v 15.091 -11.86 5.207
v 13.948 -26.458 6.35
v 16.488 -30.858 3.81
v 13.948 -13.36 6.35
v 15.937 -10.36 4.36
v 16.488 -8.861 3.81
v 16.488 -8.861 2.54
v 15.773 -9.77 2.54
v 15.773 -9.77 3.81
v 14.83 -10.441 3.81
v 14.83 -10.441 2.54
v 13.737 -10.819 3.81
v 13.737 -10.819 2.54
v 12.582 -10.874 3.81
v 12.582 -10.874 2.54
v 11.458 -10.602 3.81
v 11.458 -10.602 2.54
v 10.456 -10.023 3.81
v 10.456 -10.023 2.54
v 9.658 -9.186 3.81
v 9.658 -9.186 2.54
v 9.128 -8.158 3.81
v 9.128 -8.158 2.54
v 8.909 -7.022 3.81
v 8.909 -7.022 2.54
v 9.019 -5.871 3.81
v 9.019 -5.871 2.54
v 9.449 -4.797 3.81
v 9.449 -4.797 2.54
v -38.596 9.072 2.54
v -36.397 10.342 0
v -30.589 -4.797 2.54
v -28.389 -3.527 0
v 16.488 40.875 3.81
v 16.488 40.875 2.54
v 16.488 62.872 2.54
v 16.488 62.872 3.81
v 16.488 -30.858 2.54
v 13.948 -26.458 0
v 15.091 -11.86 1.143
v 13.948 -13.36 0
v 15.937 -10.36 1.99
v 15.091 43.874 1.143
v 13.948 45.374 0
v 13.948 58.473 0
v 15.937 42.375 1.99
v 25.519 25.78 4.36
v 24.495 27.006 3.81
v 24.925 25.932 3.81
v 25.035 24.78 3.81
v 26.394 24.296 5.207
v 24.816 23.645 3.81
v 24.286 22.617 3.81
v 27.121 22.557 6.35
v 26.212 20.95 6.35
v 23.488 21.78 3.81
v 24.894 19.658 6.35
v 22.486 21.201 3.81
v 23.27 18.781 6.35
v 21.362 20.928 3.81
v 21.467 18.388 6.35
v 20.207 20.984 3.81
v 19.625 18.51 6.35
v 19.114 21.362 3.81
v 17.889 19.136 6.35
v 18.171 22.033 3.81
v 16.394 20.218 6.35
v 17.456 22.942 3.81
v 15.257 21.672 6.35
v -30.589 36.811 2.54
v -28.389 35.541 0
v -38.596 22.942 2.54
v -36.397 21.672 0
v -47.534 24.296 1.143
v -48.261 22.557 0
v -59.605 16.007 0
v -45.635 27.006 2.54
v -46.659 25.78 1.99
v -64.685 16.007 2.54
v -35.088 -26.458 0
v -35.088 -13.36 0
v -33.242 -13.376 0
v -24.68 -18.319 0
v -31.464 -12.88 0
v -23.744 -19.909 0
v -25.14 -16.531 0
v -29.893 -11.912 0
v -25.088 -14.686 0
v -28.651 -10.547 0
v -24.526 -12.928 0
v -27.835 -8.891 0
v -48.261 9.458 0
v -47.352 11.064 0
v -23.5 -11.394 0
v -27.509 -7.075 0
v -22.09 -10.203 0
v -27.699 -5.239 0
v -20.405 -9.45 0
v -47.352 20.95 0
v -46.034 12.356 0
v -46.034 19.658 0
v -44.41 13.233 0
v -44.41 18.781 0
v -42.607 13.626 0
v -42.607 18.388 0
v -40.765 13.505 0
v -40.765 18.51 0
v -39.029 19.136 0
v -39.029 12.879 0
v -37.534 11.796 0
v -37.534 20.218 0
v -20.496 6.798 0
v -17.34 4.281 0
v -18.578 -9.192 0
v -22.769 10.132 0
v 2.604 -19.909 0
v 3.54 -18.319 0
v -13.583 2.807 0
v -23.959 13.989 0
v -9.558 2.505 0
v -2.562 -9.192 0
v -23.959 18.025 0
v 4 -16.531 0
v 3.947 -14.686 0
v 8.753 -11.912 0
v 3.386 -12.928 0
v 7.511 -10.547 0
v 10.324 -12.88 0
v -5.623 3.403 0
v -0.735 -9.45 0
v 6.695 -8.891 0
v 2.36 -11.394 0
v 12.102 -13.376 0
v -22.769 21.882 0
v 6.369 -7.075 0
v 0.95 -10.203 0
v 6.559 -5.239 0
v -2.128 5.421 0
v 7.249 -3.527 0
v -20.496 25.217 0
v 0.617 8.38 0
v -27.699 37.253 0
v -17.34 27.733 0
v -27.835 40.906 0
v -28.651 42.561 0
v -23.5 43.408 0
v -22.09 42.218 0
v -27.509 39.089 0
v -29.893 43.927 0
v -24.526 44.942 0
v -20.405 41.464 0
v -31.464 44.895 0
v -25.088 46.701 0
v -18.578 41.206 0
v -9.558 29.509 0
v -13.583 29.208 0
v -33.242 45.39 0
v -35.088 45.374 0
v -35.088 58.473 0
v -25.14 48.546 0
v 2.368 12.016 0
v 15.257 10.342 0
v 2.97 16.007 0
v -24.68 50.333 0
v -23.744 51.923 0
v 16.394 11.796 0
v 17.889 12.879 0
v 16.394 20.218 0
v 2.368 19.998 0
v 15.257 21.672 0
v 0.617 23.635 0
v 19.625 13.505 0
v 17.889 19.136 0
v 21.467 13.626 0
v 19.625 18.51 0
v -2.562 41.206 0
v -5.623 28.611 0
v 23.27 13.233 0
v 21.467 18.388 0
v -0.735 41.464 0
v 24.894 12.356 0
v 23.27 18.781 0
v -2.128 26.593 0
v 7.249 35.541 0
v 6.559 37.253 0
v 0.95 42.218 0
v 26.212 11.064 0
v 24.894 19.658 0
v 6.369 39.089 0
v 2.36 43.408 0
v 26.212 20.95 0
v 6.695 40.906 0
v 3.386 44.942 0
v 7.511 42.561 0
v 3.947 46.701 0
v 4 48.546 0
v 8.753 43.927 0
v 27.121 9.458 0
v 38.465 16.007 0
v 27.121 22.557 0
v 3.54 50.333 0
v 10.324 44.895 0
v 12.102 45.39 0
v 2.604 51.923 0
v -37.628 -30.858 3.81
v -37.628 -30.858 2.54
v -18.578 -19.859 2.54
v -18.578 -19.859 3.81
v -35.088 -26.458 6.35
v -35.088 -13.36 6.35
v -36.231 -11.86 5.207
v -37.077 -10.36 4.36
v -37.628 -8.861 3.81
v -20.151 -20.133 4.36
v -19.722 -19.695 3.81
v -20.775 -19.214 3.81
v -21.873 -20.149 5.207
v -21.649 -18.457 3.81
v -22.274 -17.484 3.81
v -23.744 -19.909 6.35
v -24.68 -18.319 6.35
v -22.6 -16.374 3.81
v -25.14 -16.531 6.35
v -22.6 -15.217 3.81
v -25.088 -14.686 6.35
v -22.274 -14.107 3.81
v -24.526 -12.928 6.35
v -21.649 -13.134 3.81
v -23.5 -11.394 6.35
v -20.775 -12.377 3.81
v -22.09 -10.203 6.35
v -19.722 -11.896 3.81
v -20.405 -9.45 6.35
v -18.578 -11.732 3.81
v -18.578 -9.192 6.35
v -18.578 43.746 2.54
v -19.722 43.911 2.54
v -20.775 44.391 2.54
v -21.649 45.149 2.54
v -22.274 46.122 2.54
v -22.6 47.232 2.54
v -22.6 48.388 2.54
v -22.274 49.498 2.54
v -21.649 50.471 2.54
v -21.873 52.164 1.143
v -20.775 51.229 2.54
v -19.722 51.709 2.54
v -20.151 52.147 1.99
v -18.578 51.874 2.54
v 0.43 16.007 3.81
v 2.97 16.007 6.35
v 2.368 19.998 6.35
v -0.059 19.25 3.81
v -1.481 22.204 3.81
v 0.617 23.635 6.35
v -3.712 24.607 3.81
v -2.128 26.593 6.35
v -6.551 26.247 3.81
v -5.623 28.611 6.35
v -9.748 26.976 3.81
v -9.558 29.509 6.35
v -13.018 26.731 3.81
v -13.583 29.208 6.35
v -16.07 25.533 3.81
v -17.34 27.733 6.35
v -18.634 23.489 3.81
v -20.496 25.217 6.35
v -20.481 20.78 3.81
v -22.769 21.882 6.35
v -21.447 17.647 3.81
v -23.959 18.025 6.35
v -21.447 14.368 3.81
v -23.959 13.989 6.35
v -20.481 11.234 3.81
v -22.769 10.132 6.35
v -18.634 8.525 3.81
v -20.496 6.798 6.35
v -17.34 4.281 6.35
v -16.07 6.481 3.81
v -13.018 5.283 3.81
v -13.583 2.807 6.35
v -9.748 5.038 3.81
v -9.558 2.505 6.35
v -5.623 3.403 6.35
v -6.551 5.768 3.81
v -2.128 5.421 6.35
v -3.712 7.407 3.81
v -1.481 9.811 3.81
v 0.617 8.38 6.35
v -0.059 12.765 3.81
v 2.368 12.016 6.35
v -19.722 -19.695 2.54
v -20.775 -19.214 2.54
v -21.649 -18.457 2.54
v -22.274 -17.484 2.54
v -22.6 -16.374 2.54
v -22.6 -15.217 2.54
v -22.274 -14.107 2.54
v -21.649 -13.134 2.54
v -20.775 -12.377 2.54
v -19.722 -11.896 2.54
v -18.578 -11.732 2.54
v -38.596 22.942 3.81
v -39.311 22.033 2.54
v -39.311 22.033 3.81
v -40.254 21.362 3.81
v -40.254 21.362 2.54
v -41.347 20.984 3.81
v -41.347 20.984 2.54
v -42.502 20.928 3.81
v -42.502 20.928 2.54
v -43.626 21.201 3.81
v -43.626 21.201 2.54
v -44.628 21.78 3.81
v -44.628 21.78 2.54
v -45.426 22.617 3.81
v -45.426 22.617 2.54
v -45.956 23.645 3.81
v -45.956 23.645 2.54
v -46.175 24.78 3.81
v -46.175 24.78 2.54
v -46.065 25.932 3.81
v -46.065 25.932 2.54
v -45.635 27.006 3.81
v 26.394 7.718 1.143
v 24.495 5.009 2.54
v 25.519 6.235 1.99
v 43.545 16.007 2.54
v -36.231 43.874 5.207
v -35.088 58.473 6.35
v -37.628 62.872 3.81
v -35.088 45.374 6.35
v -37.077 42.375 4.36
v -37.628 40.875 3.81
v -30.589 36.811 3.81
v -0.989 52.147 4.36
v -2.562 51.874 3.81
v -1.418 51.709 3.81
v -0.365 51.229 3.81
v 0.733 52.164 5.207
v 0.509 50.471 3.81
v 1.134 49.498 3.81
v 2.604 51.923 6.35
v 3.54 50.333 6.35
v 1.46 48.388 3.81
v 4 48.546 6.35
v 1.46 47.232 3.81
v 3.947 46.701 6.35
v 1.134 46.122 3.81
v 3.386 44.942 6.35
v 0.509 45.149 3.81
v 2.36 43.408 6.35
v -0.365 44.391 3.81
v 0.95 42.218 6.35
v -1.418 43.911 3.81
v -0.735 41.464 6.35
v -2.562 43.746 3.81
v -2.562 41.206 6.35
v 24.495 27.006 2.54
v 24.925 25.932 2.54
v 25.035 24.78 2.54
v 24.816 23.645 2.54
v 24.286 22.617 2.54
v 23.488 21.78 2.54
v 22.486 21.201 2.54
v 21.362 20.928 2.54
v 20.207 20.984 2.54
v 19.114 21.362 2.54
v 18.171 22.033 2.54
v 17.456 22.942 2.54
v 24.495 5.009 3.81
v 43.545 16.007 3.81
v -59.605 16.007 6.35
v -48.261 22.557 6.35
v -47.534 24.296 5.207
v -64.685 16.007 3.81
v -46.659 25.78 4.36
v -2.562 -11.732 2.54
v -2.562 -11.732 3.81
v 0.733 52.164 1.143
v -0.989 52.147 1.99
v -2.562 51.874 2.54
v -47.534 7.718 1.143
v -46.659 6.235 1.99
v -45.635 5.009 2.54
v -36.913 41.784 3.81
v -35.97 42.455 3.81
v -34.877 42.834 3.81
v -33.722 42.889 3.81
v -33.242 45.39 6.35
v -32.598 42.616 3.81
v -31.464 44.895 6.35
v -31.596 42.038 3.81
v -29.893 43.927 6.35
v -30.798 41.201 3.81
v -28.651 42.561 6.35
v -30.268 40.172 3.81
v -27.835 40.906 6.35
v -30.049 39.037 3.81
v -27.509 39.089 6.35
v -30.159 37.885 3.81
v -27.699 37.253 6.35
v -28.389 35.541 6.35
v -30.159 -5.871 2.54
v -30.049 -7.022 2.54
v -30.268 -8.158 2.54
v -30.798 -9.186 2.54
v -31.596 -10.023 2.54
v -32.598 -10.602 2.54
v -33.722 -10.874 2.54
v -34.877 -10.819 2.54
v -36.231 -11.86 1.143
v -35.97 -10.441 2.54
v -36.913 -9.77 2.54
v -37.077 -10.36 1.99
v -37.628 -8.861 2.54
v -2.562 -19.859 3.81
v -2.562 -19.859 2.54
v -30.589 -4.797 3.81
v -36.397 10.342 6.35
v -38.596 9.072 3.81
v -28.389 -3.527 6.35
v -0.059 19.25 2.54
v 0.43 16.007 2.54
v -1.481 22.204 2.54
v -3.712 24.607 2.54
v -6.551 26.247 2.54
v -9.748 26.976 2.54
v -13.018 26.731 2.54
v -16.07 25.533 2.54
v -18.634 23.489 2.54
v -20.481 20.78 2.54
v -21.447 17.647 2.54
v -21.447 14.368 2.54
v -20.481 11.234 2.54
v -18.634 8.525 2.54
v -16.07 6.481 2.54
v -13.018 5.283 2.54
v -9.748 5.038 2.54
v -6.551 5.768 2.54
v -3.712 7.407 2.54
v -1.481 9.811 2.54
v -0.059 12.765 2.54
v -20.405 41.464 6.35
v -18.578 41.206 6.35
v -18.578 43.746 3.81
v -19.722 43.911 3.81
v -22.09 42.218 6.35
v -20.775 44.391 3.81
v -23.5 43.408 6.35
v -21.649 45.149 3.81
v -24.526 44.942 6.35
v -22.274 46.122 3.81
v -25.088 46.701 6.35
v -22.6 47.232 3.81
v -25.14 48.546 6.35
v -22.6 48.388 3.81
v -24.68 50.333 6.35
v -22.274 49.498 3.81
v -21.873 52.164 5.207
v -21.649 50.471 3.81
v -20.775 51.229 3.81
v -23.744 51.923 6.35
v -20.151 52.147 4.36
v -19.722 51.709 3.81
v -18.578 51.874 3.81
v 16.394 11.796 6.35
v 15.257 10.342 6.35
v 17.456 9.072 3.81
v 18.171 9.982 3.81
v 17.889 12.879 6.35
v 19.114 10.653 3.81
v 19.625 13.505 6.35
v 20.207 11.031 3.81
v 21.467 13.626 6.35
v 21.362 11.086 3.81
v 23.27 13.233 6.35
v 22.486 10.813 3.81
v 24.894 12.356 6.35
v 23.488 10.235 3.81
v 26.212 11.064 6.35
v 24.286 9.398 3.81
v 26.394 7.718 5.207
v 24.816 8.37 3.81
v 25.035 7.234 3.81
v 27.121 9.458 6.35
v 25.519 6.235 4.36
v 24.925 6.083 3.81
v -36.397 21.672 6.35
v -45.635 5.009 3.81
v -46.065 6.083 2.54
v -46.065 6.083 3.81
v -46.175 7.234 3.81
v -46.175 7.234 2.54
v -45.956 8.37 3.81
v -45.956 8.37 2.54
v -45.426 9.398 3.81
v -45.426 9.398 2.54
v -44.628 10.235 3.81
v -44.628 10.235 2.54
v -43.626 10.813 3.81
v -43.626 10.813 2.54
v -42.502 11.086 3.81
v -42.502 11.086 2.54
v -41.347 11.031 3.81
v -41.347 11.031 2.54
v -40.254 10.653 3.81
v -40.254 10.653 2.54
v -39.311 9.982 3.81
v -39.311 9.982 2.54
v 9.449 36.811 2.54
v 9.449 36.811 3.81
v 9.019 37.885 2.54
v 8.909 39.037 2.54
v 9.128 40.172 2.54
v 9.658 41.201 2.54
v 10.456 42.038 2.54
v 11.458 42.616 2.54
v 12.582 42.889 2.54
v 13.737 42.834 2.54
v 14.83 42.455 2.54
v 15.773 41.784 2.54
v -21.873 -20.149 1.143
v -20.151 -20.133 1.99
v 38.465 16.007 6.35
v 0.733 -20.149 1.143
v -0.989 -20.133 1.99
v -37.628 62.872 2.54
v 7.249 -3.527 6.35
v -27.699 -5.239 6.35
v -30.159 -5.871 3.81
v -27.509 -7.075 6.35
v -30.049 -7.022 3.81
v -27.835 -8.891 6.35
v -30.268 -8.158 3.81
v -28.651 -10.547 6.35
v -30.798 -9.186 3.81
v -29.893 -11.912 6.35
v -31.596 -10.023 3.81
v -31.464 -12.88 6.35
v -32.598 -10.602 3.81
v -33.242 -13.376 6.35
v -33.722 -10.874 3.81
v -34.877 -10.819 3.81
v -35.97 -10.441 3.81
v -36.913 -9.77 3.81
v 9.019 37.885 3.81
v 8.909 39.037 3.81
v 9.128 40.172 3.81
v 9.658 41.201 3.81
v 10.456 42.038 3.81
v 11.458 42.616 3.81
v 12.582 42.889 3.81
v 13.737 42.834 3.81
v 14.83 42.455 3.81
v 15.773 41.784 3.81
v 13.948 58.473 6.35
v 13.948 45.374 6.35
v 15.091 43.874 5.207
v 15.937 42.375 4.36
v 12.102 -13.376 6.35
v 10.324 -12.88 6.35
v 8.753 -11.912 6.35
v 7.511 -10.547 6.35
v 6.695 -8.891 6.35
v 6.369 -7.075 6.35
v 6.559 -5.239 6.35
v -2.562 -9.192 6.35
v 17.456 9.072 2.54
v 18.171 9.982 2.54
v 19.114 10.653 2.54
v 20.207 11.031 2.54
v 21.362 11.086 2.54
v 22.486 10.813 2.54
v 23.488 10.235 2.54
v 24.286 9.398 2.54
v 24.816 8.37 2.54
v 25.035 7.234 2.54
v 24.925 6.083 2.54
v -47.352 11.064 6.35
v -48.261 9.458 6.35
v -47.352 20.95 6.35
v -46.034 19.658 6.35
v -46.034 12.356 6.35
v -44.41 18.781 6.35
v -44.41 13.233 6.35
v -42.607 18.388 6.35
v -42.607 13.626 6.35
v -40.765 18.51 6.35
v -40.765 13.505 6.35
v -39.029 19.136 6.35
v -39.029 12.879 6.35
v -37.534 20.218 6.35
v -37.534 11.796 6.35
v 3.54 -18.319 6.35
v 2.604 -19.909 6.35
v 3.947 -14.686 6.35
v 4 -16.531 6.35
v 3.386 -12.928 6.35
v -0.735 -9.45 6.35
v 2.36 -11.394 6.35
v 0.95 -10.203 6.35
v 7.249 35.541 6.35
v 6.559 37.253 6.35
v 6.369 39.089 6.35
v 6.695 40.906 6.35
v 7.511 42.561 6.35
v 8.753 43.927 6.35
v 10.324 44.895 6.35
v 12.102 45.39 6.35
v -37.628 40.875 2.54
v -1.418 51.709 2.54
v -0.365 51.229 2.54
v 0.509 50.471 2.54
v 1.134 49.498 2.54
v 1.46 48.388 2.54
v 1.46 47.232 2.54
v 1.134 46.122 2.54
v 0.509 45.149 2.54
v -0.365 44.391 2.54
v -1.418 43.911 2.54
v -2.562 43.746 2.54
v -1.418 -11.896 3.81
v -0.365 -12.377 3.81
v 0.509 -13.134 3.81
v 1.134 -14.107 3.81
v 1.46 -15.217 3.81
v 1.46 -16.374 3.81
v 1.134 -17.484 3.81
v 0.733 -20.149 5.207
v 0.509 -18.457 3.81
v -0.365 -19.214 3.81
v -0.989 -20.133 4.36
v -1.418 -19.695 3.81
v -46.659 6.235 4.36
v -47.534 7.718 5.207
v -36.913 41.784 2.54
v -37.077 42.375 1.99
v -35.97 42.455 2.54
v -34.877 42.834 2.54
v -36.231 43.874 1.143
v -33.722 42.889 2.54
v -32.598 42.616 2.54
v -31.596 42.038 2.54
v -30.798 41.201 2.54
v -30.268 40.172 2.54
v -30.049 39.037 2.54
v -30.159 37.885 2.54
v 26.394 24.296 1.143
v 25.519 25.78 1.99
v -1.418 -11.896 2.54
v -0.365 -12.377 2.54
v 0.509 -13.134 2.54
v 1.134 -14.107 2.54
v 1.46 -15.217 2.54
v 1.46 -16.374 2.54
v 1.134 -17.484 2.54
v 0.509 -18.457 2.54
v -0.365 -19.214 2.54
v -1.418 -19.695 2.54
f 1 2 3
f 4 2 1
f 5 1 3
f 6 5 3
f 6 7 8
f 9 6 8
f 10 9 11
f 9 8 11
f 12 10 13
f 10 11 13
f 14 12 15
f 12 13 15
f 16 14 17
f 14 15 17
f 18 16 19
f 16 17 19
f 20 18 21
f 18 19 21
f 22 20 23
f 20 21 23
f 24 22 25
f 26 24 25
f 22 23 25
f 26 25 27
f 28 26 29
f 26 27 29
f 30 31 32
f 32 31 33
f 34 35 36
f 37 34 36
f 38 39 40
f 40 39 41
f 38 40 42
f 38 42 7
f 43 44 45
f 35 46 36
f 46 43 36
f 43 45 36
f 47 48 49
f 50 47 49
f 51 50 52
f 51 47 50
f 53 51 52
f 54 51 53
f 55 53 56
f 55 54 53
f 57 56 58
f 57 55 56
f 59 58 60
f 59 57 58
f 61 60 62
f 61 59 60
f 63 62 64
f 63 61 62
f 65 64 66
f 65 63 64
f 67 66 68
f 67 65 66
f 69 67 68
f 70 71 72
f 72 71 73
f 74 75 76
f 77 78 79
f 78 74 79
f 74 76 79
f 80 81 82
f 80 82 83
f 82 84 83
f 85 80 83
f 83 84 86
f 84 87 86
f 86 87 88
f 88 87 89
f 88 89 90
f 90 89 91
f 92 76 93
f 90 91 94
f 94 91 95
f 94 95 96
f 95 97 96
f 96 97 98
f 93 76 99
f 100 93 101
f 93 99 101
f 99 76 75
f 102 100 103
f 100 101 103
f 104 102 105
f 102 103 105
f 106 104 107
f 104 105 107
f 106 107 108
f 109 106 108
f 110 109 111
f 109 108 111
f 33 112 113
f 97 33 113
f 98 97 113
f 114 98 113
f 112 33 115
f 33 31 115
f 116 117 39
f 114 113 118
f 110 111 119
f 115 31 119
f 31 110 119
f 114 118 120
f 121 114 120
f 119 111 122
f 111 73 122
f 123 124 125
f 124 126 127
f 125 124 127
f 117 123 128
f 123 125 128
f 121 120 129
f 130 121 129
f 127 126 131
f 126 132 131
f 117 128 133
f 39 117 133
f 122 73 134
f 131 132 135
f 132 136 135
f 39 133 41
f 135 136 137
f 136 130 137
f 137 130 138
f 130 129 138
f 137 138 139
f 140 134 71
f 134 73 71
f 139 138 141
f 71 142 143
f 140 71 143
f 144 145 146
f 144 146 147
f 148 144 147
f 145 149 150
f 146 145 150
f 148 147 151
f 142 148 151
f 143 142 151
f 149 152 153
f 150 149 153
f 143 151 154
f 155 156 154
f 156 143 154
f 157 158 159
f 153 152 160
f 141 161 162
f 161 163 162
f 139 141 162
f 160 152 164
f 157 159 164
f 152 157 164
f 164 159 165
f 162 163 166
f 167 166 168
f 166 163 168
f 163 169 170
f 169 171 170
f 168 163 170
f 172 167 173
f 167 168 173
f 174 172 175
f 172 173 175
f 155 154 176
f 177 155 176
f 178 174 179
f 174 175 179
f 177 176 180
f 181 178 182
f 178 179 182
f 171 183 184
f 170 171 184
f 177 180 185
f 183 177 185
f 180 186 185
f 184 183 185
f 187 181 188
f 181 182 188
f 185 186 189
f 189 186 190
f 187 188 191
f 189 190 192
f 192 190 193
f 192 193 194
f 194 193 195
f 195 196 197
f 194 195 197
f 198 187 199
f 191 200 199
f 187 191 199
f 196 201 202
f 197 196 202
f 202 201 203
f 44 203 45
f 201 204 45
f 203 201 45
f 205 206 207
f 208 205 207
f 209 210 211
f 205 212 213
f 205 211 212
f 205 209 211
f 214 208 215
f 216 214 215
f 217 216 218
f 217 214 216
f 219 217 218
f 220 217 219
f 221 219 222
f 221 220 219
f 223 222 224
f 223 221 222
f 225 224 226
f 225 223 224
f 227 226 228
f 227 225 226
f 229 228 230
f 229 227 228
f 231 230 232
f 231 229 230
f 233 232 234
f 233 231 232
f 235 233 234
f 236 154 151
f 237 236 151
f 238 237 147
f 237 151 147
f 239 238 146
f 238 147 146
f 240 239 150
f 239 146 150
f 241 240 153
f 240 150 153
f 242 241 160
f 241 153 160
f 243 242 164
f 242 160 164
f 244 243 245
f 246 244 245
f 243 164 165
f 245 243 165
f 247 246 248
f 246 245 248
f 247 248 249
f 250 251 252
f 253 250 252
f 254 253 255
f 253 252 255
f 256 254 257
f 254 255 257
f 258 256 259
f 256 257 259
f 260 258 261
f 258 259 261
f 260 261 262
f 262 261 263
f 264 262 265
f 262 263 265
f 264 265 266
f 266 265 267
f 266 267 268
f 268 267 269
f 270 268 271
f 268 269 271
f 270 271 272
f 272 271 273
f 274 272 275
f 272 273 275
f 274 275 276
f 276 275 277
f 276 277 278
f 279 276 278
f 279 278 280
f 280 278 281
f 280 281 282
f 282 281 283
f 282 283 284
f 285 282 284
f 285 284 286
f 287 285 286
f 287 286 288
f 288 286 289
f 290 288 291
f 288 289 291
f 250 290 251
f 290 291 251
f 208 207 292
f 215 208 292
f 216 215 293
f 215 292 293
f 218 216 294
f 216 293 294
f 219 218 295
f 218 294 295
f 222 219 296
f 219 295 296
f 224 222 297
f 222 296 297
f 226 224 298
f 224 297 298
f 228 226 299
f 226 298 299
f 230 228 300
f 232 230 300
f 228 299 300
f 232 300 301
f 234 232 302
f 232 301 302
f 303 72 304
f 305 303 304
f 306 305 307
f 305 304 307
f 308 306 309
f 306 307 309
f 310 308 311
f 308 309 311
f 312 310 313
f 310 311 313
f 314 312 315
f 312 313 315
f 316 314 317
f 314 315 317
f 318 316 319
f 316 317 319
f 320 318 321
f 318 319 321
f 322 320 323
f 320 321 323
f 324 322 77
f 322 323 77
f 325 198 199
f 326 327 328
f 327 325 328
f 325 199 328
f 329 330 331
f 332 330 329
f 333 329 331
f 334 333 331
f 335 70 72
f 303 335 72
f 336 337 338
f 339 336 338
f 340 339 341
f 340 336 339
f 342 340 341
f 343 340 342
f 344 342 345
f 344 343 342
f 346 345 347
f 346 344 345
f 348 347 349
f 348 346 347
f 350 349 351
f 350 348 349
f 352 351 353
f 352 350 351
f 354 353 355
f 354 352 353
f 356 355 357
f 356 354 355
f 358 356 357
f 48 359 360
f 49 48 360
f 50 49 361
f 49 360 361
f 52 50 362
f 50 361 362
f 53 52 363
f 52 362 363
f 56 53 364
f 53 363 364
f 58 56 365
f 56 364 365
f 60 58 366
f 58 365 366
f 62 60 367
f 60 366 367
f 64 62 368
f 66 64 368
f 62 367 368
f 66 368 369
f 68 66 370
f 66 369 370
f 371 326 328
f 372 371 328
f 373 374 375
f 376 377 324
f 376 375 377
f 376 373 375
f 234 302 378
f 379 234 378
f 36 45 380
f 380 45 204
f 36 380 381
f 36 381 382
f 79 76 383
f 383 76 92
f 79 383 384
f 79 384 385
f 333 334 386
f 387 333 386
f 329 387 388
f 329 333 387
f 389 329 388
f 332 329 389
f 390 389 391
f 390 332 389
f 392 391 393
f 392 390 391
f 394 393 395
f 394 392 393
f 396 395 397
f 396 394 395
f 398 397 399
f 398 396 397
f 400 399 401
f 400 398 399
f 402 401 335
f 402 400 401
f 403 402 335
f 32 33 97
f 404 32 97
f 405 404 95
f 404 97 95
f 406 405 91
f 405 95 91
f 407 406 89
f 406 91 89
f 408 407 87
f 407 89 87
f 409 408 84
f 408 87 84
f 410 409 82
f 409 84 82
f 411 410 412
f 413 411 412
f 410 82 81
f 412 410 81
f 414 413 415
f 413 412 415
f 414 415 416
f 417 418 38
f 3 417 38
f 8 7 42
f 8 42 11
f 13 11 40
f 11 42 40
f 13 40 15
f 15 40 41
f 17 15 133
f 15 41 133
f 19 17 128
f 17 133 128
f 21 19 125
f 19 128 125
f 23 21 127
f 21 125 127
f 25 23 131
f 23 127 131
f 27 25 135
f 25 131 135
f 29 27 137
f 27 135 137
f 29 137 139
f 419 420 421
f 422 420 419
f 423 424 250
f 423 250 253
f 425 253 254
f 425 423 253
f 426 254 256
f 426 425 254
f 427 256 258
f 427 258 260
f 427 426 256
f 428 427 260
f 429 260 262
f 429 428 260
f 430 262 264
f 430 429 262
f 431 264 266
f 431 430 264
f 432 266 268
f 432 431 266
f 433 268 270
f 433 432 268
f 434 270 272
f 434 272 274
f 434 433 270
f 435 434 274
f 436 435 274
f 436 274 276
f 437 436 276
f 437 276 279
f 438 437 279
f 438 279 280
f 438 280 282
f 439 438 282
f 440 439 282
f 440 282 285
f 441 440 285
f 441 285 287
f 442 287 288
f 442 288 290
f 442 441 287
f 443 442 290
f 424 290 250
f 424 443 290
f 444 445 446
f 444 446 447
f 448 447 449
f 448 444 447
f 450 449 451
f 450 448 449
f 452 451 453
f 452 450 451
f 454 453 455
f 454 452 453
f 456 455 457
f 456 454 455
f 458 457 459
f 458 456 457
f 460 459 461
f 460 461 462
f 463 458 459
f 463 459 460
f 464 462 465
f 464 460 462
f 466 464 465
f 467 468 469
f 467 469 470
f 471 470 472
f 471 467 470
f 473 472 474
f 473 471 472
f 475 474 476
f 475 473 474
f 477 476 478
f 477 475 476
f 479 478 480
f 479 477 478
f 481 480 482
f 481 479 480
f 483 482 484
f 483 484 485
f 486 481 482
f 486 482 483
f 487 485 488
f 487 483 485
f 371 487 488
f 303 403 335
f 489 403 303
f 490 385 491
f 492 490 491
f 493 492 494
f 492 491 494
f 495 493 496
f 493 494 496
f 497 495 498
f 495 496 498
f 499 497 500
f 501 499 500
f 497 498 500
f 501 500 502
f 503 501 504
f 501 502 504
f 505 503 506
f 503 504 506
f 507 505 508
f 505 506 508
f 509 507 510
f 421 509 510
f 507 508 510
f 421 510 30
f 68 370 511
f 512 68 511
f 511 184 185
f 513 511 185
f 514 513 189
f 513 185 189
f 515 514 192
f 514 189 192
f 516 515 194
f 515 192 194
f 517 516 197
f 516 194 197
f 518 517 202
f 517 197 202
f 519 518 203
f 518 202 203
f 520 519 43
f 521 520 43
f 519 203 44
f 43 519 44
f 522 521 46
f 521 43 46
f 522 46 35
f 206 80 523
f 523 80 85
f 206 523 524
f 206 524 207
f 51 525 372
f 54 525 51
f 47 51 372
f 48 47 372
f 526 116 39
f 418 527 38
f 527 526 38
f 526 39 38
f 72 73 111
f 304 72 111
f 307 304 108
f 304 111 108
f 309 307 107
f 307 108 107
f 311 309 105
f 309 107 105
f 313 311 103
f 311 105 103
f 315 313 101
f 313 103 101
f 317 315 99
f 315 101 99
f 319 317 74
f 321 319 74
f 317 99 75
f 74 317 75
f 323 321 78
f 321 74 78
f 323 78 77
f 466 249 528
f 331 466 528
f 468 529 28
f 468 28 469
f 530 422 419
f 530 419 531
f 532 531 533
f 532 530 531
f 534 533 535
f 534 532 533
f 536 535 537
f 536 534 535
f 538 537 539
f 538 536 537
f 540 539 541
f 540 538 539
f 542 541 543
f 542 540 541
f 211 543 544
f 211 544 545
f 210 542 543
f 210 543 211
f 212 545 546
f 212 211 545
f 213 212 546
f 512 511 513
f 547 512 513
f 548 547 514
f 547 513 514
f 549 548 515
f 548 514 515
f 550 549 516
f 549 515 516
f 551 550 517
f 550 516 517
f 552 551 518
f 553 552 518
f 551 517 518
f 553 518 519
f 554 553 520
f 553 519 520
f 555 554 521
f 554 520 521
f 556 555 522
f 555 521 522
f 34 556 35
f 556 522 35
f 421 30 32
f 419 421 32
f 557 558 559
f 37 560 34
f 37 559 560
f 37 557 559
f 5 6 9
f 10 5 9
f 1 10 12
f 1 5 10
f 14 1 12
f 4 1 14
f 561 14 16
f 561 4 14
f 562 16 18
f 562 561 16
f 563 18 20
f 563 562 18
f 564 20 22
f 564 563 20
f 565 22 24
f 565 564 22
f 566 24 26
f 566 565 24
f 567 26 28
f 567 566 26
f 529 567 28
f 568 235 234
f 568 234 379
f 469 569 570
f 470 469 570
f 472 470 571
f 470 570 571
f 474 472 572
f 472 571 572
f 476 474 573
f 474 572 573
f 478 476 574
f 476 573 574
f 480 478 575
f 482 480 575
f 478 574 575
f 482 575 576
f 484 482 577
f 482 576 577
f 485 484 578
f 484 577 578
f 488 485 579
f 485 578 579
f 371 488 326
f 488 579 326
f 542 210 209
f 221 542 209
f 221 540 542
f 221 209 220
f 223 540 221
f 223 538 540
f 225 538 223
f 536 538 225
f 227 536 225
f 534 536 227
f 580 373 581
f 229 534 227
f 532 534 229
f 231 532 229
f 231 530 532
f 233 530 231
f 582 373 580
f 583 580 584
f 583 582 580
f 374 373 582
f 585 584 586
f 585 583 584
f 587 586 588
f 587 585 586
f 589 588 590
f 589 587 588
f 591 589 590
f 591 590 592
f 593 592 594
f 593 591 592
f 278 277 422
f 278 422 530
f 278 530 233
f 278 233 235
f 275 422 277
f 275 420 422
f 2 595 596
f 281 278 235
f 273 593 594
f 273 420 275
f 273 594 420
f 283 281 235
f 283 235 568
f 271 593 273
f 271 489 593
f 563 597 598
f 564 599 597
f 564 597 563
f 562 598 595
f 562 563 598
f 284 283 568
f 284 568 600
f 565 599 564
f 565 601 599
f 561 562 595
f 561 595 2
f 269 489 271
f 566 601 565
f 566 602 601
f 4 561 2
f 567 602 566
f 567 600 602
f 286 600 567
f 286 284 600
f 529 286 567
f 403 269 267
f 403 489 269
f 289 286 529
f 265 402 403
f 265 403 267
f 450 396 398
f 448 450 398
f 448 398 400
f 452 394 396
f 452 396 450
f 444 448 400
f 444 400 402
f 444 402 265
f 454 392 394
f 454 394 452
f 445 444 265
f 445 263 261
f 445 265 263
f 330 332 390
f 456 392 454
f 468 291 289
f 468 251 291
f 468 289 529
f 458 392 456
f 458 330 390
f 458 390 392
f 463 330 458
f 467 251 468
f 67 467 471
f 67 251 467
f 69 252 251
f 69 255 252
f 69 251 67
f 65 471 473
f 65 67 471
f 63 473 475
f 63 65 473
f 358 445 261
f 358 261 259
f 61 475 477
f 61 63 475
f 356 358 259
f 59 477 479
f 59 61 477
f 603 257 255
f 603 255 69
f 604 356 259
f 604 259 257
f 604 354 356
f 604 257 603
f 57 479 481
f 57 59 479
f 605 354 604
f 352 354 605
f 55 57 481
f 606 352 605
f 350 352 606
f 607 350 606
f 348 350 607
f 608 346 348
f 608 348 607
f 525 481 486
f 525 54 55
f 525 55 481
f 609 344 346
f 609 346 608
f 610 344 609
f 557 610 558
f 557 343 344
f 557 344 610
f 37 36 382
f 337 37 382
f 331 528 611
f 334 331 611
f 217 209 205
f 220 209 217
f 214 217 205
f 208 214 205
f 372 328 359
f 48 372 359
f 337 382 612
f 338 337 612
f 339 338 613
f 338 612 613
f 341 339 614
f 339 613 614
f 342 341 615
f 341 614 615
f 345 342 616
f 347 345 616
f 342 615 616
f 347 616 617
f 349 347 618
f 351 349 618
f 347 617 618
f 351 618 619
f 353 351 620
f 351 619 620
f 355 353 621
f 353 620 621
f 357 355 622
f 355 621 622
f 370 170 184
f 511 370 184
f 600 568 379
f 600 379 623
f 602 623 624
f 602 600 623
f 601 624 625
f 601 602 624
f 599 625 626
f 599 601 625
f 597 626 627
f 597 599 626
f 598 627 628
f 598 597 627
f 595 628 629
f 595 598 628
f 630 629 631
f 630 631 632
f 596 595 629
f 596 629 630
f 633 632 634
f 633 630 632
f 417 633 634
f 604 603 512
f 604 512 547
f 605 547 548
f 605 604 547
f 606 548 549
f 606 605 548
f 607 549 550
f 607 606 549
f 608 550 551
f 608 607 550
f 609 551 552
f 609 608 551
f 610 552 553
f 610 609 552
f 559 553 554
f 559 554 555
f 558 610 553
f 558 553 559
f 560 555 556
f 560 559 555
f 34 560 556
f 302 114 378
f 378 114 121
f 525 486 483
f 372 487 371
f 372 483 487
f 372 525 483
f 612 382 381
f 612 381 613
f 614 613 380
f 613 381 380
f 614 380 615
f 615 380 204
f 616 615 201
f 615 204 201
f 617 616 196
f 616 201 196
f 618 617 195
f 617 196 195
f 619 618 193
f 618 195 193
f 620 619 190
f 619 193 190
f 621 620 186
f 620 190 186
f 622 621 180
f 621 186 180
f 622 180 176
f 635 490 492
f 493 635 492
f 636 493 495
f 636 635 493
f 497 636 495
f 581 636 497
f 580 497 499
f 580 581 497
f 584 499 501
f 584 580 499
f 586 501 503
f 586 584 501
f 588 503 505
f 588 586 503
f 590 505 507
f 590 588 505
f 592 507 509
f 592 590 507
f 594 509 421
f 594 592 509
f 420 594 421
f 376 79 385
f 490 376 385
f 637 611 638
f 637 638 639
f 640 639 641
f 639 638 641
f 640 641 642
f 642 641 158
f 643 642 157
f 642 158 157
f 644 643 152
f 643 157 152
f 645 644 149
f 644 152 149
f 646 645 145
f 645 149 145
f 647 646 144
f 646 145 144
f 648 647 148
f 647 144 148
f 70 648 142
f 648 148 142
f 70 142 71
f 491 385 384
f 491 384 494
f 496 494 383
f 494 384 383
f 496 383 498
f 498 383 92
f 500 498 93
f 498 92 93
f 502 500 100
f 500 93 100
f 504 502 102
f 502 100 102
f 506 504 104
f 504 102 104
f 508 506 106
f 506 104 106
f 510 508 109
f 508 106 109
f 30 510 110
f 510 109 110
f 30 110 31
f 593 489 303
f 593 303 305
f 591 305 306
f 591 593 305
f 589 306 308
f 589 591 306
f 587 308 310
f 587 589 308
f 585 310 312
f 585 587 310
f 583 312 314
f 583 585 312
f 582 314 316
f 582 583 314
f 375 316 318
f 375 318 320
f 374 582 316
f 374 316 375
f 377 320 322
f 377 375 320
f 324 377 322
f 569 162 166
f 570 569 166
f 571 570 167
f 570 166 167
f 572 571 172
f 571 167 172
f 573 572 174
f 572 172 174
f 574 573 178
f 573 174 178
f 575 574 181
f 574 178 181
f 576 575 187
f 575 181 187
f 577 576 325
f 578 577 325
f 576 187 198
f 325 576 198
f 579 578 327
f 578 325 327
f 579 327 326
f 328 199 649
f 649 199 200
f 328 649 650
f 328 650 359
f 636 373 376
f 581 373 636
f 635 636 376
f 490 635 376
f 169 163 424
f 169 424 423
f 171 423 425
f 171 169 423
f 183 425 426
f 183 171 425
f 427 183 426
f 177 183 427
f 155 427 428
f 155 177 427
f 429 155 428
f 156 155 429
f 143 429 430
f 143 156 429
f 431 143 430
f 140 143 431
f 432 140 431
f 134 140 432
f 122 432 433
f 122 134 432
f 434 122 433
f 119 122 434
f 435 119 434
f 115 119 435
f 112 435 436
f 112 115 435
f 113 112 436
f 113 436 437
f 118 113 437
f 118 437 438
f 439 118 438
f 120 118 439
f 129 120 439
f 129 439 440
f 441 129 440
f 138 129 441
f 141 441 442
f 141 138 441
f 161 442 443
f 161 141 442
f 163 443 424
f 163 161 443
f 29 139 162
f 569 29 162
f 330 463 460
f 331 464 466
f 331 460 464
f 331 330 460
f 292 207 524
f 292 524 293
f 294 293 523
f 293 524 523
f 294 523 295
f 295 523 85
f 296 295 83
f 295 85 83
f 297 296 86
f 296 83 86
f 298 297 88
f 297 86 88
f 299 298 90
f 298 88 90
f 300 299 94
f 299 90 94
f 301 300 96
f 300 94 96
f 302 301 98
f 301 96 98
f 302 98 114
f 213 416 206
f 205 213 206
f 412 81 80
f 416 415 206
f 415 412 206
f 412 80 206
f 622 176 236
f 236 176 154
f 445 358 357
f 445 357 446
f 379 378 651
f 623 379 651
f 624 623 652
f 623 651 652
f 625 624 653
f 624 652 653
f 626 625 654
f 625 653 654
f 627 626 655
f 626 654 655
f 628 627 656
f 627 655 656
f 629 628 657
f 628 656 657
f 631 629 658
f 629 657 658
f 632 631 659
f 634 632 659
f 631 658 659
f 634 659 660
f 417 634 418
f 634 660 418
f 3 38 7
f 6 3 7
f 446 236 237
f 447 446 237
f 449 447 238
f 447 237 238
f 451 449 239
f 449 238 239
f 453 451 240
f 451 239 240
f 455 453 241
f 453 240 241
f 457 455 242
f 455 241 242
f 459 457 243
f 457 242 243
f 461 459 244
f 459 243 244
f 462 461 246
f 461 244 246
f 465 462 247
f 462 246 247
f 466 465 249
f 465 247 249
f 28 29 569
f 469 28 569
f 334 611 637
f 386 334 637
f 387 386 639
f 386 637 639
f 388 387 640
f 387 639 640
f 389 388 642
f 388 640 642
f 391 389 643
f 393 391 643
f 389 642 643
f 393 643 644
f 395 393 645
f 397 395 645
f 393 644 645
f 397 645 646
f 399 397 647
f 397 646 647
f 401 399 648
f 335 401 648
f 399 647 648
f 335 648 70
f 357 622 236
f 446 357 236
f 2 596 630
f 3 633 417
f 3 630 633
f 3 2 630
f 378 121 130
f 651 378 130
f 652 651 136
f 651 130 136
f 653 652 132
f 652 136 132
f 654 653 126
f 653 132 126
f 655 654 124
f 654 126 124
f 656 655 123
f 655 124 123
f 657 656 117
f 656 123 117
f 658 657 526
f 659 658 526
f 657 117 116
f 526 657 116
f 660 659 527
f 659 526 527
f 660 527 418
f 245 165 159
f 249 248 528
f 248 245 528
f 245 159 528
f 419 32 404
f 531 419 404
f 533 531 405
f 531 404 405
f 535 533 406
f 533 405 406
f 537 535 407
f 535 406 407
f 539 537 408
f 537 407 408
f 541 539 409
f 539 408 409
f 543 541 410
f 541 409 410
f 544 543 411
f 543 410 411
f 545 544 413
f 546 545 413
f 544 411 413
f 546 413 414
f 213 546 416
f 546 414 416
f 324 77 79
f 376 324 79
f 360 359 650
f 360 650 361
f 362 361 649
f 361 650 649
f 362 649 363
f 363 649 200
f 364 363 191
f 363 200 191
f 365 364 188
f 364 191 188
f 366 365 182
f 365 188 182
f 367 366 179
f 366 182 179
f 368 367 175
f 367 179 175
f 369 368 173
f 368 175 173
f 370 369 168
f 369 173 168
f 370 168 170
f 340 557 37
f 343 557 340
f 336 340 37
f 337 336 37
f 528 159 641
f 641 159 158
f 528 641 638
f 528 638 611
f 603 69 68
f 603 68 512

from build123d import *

# Parameters (mm, degrees)
F0_R     = 11
F1_DEPTH = 6.35
F2_SIZE  = 2.54


with BuildPart() as f1:
    # F0 (on Top) → F1 (new body)
    with BuildSketch(Plane.XY):
        with BuildLine():
            ThreePointArc((-45.635105, 5.008696), (-44.147658, 10.559926), (-38.596428, 9.072478))
            Line((-38.596428, 9.072478), (-30.58888, -4.797003))
            ThreePointArc((-30.58888, -4.797003), (-32.076327, -10.348232), (-37.627557, -8.860785))
            Line((-37.627557, -8.860785), (-37.627557, -30.85783))
            Line((-37.627557, -30.85783), (-18.577557, -19.859307))
            ThreePointArc((-18.577557, -19.859307), (-22.641339, -15.795525), (-18.577557, -11.731743))
            Line((-18.577557, -11.731743), (-2.562459, -11.731743))
            ThreePointArc((-2.562459, -11.731743), (1.501323, -15.795525), (-2.562459, -19.859307))
            Line((-2.562459, -19.859307), (16.487541, -30.85783))
            Line((16.487541, -30.85783), (16.487541, -8.860785))
            ThreePointArc((16.487541, -8.860785), (10.936311, -10.348232), (9.448863, -4.797003))
            Line((9.448863, -4.797003), (17.456412, 9.072478))
            ThreePointArc((17.456412, 9.072478), (23.007642, 10.559926), (24.495089, 5.008696))
            Line((24.495089, 5.008696), (43.545089, 16.007219))
            Line((43.545089, 16.007219), (24.495089, 27.005742))
            ThreePointArc((24.495089, 27.005742), (23.007642, 21.454512), (17.456412, 22.941959))
            Line((17.456412, 22.941959), (9.448863, 36.81144))
            ThreePointArc((9.448863, 36.81144), (10.936311, 42.36267), (16.487541, 40.875223))
            Line((16.487541, 40.875223), (16.487541, 62.872268))
            Line((16.487541, 62.872268), (-2.562459, 51.873745))
            ThreePointArc((-2.562459, 51.873745), (1.501323, 47.809963), (-2.562459, 43.746181))
            Line((-2.562459, 43.746181), (-18.577557, 43.746181))
            ThreePointArc((-18.577557, 43.746181), (-22.641339, 47.809963), (-18.577557, 51.873745))
            Line((-18.577557, 51.873745), (-37.627557, 62.872268))
            Line((-37.627557, 62.872268), (-37.627557, 40.875223))
            ThreePointArc((-37.627557, 40.875223), (-32.076327, 42.36267), (-30.58888, 36.81144))
            Line((-30.58888, 36.81144), (-38.596428, 22.941959))
            ThreePointArc((-38.596428, 22.941959), (-44.147658, 21.454512), (-45.635105, 27.005742))
            Line((-45.635105, 27.005742), (-64.685105, 16.007219))
            Line((-64.685105, 16.007219), (-45.635105, 5.008696))
        make_face()
        with Locations((-10.570008, 16.007219)):
            Circle(F0_R, mode=Mode.SUBTRACT)
    extrude(amount=F1_DEPTH)

    # F2
    f2_edges = [f1.edges().sort_by_distance(p)[0] for p in [
        (-44.147658, 21.454512, 6.35),
        (-55.160105, 21.50648, 6.35),
        (-55.160105, 10.507958, 6.35),
        (-44.147658, 10.559926, 6.35),
        (-34.592654, 2.137738, 6.35),
        (-32.076327, -10.348232, 6.35),
        (-37.627557, -19.859307, 6.35),
        (-28.102557, -25.358569, 6.35),
        (-22.641339, -15.795525, 6.35),
        (-10.570008, -11.731743, 6.35),
        (1.501323, -15.795525, 6.35),
        (6.962541, -25.358569, 6.35),
        (16.487541, -19.859307, 6.35),
        (10.936311, -10.348232, 6.35),
        (13.452638, 2.137738, 6.35),
        (23.007642, 10.559926, 6.35),
        (34.020089, 10.507958, 6.35),
        (34.020089, 21.50648, 6.35),
        (23.007642, 21.454512, 6.35),
        (13.452638, 29.8767, 6.35),
        (10.936311, 42.36267, 6.35),
        (16.487541, 51.873745, 6.35),
        (6.962541, 57.373007, 6.35),
        (1.501323, 47.809963, 6.35),
        (-10.570008, 43.746181, 6.35),
        (-22.641339, 47.809963, 6.35),
        (-28.102557, 57.373007, 6.35),
        (-37.627557, 51.873745, 6.35),
        (-32.076327, 42.36267, 6.35),
        (-34.592654, 29.8767, 6.35),
        (-21.570008, 16.007219, 6.35),
        (-44.147658, 21.454512, 0),
        (-55.160105, 21.50648, 0),
        (-55.160105, 10.507958, 0),
        (-44.147658, 10.559926, 0),
        (-34.592654, 2.137738, 0),
        (-32.076327, -10.348232, 0),
        (-37.627557, -19.859307, 0),
        (-28.102557, -25.358569, 0),
        (-22.641339, -15.795525, 0),
        (-10.570008, -11.731743, 0),
        (1.501323, -15.795525, 0),
        (6.962541, -25.358569, 0),
        (16.487541, -19.859307, 0),
        (10.936311, -10.348232, 0),
        (13.452638, 2.137738, 0),
        (23.007642, 10.559926, 0),
        (34.020089, 10.507958, 0),
        (34.020089, 21.50648, 0),
        (23.007642, 21.454512, 0),
        (13.452638, 29.8767, 0),
        (10.936311, 42.36267, 0),
        (16.487541, 51.873745, 0),
        (6.962541, 57.373007, 0),
        (1.501323, 47.809963, 0),
        (-10.570008, 43.746181, 0),
        (-22.641339, 47.809963, 0),
        (-28.102557, 57.373007, 0),
        (-37.627557, 51.873745, 0),
        (-32.076327, 42.36267, 0),
        (-34.592654, 29.8767, 0),
        (-21.570008, 16.007219, 0),
    ]]
    chamfer(f2_edges, length=F2_SIZE)


solid = f1.part
